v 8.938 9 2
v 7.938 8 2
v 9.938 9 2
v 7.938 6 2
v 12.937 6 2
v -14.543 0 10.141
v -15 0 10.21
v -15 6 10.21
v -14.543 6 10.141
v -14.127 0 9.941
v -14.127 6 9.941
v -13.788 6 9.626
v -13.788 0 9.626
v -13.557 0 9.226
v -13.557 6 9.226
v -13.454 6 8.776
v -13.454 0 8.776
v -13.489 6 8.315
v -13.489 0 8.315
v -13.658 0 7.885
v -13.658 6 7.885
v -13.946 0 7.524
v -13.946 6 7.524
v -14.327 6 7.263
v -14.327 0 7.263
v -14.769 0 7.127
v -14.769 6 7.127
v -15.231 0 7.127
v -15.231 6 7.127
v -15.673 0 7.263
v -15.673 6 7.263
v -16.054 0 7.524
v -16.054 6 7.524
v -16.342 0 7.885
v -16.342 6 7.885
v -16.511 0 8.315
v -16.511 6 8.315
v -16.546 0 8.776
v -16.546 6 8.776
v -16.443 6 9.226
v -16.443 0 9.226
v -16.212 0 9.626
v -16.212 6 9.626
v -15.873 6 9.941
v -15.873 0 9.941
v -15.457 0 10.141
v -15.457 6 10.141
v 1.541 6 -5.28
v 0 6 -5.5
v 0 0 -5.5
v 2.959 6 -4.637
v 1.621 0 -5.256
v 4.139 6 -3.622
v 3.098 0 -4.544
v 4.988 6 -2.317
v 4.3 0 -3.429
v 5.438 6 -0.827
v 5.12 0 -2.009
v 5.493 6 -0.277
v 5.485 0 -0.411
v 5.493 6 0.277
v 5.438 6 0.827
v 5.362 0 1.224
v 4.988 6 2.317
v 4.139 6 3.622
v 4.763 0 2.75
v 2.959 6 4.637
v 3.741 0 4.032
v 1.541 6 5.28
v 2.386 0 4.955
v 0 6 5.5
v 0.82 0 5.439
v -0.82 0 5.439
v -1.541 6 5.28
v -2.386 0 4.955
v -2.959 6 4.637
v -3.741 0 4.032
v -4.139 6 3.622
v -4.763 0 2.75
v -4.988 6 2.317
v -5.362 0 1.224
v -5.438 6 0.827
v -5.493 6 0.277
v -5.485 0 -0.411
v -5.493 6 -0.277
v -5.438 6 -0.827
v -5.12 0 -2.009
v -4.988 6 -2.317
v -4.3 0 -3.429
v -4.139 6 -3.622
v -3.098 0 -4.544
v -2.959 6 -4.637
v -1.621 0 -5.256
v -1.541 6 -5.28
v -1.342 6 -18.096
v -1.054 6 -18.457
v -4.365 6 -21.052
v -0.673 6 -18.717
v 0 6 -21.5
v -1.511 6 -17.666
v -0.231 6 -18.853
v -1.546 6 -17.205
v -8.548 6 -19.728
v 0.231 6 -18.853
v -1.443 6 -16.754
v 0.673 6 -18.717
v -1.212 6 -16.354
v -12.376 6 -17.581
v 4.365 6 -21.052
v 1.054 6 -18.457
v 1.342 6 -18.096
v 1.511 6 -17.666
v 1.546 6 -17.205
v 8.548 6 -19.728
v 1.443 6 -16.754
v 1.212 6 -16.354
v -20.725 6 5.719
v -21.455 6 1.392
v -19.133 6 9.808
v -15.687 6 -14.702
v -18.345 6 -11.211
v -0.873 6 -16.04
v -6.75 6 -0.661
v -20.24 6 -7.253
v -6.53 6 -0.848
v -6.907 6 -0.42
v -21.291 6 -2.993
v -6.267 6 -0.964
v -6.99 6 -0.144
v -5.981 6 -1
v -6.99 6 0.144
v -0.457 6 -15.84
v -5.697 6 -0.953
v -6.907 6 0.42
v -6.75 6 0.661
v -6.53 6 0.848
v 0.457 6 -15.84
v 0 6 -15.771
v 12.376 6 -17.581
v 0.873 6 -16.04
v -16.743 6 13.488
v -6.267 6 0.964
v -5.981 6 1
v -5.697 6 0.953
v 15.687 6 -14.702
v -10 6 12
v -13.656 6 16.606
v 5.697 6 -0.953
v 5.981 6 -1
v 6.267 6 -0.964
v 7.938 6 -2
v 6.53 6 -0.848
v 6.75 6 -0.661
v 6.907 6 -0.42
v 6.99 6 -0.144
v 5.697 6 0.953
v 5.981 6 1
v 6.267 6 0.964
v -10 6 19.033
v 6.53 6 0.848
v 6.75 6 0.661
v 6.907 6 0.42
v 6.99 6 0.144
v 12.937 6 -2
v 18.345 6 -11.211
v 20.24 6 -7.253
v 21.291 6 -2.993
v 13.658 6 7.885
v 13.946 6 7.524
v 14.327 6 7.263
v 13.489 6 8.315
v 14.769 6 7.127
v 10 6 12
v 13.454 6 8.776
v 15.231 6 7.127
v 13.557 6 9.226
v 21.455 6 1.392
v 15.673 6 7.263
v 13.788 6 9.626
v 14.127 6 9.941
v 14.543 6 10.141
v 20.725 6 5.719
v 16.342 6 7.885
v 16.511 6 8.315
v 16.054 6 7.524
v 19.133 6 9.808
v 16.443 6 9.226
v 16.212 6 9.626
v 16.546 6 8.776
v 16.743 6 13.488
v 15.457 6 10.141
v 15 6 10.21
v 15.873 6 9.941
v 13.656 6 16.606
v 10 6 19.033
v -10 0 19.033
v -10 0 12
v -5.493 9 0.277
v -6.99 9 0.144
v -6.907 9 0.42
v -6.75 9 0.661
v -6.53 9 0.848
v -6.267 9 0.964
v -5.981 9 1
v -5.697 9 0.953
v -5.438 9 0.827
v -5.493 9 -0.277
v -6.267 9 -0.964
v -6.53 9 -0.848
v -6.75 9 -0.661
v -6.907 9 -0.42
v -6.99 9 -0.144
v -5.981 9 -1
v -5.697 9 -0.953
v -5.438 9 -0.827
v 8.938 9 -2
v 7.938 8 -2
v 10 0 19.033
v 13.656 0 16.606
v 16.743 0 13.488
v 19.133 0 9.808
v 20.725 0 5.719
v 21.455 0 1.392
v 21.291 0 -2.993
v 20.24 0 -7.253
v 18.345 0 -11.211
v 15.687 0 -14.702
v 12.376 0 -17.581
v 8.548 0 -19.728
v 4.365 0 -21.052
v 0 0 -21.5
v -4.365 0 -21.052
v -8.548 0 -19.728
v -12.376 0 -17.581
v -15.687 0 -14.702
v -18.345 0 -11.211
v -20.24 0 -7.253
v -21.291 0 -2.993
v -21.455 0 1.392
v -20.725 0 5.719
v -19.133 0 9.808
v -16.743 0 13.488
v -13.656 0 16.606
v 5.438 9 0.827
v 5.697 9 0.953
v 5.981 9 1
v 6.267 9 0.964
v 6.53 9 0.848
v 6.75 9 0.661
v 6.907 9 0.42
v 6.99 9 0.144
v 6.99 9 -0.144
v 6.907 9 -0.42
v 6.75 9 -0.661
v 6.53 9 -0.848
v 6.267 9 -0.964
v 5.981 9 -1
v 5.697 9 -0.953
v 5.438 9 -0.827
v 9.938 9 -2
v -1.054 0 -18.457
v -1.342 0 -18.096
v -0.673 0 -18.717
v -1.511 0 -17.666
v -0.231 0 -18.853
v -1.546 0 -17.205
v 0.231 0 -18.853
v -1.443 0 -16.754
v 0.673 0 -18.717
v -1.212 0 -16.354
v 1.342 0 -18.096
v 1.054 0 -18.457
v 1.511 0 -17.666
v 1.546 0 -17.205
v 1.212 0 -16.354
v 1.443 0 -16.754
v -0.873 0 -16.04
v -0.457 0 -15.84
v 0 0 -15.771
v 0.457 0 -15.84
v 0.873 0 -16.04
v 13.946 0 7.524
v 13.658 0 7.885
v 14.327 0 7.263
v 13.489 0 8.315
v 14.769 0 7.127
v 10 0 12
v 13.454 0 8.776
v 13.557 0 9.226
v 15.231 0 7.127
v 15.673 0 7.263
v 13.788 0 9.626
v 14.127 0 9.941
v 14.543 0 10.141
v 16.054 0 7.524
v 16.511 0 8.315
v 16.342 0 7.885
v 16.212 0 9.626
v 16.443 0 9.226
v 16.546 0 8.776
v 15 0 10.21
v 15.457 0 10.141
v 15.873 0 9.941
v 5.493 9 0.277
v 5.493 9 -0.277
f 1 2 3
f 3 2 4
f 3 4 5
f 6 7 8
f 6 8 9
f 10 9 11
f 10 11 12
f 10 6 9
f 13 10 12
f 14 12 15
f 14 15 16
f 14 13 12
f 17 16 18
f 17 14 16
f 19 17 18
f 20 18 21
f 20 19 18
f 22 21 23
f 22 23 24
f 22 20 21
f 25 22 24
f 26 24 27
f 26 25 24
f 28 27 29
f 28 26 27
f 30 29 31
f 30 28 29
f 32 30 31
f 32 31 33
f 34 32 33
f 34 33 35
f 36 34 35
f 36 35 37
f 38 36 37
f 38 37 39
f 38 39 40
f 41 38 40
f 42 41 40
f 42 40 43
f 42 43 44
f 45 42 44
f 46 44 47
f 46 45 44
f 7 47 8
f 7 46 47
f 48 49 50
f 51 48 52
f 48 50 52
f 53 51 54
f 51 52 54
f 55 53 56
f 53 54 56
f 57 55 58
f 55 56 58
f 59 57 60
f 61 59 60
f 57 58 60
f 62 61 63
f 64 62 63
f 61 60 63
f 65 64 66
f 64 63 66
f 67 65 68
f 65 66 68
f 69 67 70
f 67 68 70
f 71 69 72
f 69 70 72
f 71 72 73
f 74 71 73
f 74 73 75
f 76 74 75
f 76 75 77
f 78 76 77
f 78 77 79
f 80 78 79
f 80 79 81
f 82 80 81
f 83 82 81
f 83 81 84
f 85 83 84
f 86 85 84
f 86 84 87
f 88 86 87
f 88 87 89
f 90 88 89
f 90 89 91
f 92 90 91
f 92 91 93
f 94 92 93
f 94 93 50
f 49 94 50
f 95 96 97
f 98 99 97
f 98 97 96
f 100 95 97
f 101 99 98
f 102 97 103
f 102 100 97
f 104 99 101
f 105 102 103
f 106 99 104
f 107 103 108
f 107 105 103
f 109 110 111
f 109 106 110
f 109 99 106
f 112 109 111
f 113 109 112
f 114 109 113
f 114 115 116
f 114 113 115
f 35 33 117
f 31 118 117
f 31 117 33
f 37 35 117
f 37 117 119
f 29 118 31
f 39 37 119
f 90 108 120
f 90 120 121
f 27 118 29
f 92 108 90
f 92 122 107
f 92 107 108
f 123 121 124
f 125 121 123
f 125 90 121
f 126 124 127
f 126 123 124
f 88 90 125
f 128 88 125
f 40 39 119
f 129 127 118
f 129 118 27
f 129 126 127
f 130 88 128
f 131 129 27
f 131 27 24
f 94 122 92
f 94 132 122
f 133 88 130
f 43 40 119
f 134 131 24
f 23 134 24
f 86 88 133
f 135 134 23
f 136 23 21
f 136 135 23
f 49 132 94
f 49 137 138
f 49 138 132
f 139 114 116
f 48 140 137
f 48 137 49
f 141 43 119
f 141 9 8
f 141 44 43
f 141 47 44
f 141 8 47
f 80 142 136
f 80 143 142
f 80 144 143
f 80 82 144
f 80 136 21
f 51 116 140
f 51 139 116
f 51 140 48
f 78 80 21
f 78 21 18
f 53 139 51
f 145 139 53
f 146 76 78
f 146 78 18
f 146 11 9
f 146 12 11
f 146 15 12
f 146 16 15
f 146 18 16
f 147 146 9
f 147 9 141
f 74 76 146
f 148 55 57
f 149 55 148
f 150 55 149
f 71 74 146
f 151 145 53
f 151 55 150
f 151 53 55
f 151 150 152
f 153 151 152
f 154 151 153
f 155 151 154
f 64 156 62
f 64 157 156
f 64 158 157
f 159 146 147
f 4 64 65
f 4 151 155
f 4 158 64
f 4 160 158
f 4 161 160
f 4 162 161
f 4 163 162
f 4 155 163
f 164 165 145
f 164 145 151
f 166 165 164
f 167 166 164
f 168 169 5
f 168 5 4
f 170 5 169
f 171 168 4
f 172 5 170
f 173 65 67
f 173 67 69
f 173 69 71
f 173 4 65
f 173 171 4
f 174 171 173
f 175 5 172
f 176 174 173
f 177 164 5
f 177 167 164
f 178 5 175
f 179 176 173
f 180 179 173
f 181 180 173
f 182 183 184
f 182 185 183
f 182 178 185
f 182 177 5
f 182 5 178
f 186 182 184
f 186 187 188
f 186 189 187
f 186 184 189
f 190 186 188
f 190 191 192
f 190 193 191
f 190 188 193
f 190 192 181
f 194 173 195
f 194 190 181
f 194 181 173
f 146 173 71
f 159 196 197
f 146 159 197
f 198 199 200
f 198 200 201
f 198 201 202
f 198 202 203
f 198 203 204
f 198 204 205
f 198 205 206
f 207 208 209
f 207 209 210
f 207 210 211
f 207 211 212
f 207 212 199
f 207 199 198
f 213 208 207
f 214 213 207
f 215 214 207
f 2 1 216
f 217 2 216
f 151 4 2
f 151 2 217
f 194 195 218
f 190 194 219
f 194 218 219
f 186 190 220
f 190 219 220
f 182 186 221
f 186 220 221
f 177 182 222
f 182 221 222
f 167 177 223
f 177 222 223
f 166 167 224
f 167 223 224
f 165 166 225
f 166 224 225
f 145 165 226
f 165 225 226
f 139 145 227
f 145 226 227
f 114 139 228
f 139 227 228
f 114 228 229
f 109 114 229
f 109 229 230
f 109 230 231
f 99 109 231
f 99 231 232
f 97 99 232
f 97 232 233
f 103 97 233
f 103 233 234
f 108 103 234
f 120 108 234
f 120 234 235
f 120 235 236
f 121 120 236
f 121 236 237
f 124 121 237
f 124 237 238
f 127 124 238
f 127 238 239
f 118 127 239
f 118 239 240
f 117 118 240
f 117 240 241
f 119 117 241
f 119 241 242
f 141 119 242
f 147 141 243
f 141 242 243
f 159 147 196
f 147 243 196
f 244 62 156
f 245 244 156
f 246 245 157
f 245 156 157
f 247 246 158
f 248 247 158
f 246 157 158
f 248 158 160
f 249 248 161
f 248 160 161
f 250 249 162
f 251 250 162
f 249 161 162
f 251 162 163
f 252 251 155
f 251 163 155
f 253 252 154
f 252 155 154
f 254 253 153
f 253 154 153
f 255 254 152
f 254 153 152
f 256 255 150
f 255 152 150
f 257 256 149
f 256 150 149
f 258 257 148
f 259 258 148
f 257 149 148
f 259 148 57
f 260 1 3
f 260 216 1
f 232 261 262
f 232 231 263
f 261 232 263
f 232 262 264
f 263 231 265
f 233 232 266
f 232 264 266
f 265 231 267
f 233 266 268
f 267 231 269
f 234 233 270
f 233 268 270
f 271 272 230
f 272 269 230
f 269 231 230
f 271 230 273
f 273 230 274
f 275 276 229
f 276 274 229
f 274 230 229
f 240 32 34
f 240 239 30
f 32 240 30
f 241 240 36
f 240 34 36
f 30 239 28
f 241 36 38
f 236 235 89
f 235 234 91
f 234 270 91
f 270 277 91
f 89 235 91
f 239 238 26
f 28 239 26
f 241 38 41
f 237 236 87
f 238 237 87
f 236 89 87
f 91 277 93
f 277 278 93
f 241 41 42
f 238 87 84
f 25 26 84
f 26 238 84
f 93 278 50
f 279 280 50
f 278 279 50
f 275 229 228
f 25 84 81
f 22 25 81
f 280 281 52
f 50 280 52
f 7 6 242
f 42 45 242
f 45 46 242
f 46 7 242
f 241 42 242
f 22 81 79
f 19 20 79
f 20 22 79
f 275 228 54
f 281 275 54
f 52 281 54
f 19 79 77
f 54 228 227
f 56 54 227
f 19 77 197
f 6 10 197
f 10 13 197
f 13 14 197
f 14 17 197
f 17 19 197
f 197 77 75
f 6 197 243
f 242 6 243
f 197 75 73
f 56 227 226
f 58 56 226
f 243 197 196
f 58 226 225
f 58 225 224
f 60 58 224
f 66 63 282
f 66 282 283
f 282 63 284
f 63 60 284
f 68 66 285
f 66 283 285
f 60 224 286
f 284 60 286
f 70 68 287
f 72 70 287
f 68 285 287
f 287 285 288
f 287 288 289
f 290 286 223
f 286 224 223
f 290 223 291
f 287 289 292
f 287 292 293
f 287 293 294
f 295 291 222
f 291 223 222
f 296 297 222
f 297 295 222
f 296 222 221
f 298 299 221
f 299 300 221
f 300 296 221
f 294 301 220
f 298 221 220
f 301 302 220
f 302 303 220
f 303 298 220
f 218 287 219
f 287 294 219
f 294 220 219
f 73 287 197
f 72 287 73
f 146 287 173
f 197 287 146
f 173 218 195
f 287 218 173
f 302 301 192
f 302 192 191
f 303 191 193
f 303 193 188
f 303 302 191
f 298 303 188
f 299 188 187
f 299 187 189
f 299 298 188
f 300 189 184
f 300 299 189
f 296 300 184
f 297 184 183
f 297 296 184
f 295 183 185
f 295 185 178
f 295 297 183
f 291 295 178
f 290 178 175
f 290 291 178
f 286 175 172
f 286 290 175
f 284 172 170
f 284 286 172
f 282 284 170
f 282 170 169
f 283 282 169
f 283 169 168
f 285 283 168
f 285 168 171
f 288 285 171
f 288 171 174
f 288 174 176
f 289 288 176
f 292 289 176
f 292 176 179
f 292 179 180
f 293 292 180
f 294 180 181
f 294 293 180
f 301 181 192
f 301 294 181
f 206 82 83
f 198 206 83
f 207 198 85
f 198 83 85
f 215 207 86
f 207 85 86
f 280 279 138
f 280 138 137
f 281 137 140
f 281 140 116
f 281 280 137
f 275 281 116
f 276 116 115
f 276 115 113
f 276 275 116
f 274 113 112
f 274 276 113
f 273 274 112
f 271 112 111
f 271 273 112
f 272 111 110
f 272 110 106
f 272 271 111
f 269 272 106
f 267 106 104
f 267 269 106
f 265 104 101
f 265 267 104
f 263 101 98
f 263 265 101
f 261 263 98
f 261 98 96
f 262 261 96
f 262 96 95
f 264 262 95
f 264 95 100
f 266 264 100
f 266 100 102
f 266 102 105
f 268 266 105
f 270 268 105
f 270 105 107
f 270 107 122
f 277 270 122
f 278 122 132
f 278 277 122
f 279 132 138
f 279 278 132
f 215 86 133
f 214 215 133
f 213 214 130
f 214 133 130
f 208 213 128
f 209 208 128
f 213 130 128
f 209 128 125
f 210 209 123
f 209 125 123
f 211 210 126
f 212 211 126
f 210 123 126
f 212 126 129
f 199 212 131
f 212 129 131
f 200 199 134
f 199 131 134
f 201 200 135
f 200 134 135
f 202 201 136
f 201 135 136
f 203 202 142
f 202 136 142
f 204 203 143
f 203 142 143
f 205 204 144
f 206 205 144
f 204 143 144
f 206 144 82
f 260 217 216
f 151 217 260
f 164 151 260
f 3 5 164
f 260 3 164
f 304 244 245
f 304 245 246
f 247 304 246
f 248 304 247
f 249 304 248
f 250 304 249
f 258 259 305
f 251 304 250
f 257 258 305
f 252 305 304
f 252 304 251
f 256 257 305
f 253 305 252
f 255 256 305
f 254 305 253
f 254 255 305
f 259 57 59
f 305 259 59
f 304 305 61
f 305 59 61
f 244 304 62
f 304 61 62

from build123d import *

# Parameters (mm, degrees)
SKETCH1_R           = 21.5
SKETCH1_R_2         = 1.55
BOSS_EXTRUDE1_DEPTH = 6
SKETCH2_R           = 5.5
SKETCH2_W           = 20
SKETCH2_H           = 10
CUT_EXTRUDE1_DEPTH  = 12
BOSS_EXTRUDE2_DEPTH = 3
SKETCH4_W           = 2
SKETCH4_H           = 4
BOSS_EXTRUDE3_DEPTH = 3
CHAMFER1_SIZE       = 1
CHAMFER2_SIZE       = 3


with BuildPart() as part:
    # Sketch1 → Boss-Extrude1 (new body)
    with BuildSketch(Plane(origin=(0, 0, 0), x_dir=(1, 0, 0), z_dir=(0, 1, 0))):
        with Locations(Location((0, 0, 0), (0, 0, 270))):
            Circle(SKETCH1_R)
        with Locations(Location((0, 17.320762114, 0), (0, 0, 270))):
            Circle(SKETCH1_R_2, mode=Mode.SUBTRACT)
        with Locations(Location((15, -8.66, 0), (0, 0, 270))):
            Circle(SKETCH1_R_2, mode=Mode.SUBTRACT)
        with Locations(Location((-15, -8.66, 0), (0, 0, 270))):
            Circle(SKETCH1_R_2, mode=Mode.SUBTRACT)
    extrude(amount=BOSS_EXTRUDE1_DEPTH)

    # Sketch2 → Cut-Extrude1 (cut)
    with BuildSketch(Plane(origin=(0, 0, 0), x_dir=(-1, 0, 0), z_dir=(0, -1, 0))):
        with Locations(Location((0, 0, 0), (0, 0, 90))):
            Circle(SKETCH2_R)
        with Locations((0, -17)):
            Rectangle(SKETCH2_W, SKETCH2_H)
    extrude(amount=-CUT_EXTRUDE1_DEPTH, mode=Mode.SUBTRACT)

    # Sketch3 → Boss-Extrude2 (add)
    with BuildSketch(Plane(origin=(0, 6, 0), x_dir=(1, 0, 0), z_dir=(0, 1, 0))):
        with BuildLine():
            ThreePointArc((-5.4375, 0.826797285), (-7, 0), (-5.4375, -0.826797285))
            ThreePointArc((-5.4375, -0.826797285), (-5.5, 0), (-5.4375, 0.826797285))
        make_face()
        with BuildLine():
            ThreePointArc((5.4375, -0.826797285), (7, 0), (5.4375, 0.826797285))
            ThreePointArc((5.4375, 0.826797285), (5.5, 0), (5.4375, -0.826797285))
        make_face()
    extrude(amount=BOSS_EXTRUDE2_DEPTH)

    # Sketch4 → Boss-Extrude3 (add)
    with BuildSketch(Plane(origin=(0, 6, 0), x_dir=(1, 0, 0), z_dir=(0, 1, 0))):
        with Locations((8.9375, 0)):
            Rectangle(SKETCH4_W, SKETCH4_H)
    extrude(amount=BOSS_EXTRUDE3_DEPTH)

    # Chamfer1
    chamfer1_edges = [part.edges().sort_by_distance(p)[0] for p in [
        (7.9375, 9, 0),
    ]]
    chamfer(chamfer1_edges, length=CHAMFER1_SIZE)

    # Chamfer2
    chamfer2_edges = [part.edges().sort_by_distance(p)[0] for p in [
        (9.9375, 6, 0),
    ]]
    chamfer(chamfer2_edges, length=CHAMFER2_SIZE - 0.0001)  # a hair under: the kernel refuses the full size


solid = part.part
